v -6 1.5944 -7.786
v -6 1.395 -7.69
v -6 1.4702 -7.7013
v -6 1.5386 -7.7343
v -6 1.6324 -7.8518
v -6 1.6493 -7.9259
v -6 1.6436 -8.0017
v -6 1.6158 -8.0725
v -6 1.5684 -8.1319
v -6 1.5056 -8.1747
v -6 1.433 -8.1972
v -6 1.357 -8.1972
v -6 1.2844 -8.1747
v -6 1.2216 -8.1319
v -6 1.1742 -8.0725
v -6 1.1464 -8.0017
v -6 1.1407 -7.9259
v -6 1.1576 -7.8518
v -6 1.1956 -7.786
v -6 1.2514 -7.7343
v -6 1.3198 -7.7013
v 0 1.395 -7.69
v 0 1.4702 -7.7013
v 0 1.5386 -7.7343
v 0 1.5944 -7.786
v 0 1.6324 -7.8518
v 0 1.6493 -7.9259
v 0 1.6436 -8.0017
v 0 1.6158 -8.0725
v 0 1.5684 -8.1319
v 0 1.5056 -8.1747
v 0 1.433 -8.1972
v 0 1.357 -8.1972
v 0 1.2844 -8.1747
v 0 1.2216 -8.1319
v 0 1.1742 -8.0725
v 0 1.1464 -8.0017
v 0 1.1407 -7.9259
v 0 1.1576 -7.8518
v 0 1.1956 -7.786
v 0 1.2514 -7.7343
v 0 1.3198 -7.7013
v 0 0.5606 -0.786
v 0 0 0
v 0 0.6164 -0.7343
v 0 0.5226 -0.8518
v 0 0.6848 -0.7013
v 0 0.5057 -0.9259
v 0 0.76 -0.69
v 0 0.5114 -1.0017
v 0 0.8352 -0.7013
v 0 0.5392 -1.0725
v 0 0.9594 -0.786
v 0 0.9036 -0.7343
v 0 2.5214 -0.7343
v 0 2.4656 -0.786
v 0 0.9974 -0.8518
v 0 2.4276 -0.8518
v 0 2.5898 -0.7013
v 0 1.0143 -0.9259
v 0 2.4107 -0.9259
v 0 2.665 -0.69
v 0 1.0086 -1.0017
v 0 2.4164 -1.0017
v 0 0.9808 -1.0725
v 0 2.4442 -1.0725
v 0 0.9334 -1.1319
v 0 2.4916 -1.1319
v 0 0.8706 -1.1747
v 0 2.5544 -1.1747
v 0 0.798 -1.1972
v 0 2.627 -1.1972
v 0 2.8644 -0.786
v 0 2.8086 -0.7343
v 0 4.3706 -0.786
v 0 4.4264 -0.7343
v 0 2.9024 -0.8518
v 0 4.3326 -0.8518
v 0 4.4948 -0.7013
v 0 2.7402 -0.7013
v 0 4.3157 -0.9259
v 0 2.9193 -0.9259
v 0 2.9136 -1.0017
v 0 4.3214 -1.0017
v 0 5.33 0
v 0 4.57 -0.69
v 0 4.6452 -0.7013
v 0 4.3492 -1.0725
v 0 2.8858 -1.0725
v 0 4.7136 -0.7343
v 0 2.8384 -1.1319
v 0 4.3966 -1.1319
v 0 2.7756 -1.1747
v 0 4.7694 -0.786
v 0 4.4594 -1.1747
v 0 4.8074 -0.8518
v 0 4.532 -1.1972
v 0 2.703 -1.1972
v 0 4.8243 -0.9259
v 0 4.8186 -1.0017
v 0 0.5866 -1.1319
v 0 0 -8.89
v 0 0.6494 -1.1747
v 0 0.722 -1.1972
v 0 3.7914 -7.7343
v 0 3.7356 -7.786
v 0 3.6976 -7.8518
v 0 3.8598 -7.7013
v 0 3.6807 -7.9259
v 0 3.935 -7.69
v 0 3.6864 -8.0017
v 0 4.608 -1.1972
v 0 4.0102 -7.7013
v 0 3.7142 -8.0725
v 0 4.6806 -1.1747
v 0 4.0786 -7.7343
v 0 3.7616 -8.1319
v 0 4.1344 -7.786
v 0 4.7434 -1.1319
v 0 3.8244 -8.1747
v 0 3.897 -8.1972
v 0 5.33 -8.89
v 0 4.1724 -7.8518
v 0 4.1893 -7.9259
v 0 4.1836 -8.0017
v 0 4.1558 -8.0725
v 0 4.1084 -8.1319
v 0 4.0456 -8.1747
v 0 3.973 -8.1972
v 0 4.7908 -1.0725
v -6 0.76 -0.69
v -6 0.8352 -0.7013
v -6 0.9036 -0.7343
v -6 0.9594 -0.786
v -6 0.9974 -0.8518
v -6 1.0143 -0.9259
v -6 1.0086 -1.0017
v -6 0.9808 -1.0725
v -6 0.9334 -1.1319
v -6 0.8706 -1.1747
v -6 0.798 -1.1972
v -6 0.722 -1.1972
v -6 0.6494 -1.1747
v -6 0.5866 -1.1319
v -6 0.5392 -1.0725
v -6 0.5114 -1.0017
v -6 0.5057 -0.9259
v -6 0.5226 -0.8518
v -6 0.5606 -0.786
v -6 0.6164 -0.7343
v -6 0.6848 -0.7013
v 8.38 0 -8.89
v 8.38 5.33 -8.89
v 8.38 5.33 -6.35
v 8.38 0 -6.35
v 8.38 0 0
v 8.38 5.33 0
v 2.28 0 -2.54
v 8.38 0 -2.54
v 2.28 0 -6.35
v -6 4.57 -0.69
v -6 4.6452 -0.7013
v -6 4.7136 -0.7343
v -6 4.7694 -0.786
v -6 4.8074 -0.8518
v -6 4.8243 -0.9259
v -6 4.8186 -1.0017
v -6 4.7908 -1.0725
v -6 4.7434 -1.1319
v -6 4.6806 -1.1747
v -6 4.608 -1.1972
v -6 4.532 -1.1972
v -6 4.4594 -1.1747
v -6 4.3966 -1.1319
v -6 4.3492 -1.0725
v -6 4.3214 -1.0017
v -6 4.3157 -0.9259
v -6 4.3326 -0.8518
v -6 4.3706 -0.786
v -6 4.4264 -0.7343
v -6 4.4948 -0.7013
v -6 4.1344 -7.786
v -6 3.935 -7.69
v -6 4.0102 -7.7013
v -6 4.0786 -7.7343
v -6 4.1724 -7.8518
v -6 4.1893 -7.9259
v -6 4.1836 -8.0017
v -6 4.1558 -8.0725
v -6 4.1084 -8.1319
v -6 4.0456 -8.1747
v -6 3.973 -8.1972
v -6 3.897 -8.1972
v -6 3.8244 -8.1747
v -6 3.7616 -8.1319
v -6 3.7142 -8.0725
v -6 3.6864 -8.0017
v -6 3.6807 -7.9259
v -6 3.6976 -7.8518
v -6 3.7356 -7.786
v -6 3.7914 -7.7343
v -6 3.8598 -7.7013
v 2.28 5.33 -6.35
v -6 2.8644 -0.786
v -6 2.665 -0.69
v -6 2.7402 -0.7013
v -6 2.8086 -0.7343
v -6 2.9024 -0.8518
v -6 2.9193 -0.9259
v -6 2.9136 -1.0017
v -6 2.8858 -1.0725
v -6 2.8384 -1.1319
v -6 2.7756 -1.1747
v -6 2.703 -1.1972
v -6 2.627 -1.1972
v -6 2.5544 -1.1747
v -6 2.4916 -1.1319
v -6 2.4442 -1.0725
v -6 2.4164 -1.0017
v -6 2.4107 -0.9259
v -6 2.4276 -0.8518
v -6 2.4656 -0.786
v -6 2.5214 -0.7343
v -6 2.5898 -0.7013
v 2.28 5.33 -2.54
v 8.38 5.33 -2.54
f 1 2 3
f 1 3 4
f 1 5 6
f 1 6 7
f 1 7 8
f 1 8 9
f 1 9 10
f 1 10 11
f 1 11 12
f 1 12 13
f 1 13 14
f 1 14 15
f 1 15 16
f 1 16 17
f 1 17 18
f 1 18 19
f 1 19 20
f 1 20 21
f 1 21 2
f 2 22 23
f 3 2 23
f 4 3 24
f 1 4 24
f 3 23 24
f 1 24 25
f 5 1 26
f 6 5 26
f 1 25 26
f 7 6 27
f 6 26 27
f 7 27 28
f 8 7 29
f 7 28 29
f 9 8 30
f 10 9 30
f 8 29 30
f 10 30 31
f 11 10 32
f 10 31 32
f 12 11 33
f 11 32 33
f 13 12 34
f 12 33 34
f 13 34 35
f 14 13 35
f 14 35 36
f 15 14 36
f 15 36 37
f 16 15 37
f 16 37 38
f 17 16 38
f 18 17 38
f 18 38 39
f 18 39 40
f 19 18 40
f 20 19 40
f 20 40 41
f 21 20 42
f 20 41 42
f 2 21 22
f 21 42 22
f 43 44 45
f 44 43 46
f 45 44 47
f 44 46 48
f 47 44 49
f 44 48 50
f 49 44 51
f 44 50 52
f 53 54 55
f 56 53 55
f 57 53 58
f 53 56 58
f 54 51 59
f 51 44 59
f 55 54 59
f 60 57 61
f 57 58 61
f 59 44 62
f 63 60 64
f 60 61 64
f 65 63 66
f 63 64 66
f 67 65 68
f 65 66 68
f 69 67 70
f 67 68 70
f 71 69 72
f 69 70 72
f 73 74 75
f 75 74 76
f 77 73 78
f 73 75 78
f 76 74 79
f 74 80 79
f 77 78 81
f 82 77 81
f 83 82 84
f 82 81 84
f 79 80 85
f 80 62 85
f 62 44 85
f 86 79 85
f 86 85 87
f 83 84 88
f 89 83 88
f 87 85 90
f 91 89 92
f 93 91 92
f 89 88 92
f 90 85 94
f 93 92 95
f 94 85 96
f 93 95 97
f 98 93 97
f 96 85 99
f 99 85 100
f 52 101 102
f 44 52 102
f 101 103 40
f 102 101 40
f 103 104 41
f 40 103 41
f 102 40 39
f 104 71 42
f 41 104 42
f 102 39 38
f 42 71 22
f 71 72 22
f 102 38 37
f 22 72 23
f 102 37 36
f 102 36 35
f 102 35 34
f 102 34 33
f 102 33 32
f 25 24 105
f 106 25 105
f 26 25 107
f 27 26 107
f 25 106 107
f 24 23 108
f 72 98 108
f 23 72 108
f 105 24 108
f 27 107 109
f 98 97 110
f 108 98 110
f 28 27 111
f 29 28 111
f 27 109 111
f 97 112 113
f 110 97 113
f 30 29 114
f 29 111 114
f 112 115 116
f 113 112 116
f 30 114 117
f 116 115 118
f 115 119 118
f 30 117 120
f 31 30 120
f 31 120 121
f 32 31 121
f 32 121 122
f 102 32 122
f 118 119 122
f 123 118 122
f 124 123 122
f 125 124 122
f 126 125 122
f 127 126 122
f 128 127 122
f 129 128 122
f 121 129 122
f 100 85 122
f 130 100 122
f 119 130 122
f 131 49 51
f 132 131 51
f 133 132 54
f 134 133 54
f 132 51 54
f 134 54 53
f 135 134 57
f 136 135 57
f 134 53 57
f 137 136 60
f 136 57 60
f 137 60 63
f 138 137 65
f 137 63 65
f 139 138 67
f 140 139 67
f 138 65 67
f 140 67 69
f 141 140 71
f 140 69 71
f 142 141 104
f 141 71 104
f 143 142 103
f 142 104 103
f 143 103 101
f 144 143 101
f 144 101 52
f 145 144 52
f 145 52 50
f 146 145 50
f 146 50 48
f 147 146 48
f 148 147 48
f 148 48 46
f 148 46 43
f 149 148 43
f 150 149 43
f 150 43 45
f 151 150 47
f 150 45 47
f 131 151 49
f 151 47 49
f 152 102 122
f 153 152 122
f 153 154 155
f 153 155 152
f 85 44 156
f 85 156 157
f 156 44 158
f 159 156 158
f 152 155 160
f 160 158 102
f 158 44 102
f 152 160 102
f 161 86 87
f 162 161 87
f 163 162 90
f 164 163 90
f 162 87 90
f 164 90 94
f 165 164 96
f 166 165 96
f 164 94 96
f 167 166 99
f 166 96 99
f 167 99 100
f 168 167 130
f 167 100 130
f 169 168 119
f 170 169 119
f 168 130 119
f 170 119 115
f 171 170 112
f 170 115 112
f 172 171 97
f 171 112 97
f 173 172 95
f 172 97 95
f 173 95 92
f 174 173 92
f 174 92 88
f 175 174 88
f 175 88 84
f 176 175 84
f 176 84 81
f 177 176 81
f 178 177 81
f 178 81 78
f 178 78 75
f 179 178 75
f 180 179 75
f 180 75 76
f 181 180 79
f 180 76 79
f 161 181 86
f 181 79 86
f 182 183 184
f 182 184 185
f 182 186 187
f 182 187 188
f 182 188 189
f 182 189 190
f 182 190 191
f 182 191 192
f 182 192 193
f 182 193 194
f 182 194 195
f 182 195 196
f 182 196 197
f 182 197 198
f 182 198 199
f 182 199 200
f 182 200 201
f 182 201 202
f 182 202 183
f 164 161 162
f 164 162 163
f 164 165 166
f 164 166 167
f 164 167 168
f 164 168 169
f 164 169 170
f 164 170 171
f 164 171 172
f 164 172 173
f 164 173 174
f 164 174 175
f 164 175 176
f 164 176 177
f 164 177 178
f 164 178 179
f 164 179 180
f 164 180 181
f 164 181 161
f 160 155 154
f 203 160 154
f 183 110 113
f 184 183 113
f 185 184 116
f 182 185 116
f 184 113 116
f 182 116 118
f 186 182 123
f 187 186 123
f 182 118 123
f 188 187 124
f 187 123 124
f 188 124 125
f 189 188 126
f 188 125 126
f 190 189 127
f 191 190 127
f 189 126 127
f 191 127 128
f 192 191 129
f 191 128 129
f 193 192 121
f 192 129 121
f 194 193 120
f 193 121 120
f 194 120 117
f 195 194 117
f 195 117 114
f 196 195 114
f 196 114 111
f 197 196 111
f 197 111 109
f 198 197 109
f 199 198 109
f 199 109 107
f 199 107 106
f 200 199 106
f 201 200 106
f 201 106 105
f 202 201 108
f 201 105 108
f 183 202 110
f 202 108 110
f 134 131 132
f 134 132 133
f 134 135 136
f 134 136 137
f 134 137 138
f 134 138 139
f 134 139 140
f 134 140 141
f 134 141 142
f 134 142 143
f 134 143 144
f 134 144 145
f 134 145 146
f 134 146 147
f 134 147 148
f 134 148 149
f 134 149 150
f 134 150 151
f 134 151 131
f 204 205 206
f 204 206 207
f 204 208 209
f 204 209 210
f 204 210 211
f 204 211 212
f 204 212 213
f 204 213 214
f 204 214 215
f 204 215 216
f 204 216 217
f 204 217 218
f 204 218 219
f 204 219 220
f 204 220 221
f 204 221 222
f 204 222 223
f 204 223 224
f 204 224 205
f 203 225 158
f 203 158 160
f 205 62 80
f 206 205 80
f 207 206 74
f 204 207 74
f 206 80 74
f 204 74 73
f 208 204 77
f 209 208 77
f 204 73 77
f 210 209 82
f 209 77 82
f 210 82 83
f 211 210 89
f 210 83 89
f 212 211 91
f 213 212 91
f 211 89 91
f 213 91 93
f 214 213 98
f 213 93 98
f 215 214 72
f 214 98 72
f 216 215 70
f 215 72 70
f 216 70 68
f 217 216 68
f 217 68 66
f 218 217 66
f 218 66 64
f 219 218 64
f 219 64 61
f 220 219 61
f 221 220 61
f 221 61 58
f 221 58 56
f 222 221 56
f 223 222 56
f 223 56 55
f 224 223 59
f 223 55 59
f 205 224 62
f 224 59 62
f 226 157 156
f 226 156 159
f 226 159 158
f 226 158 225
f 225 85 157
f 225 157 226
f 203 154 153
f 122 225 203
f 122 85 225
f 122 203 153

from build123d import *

# Parameters (mm, degrees)
SKETCH1_W           = 8.89
SKETCH1_H           = 5.33
BOSS_EXTRUDE1_DEPTH = 8.38
SKETCH2_W           = 3.81
SKETCH2_H           = 5.33
CUT_EXTRUDE1_DEPTH  = 6.1
SKETCH3_R           = 0.255
BOSS_EXTRUDE2_DEPTH = 6


with BuildPart() as part:
    # Sketch1 → Boss-Extrude1 (new body)
    with BuildSketch(Plane(origin=(0, 0, 0), x_dir=(0, 0, -1), z_dir=(1, 0, 0))):
        with Locations((4.445, 2.665)):
            Rectangle(SKETCH1_W, SKETCH1_H)
    extrude(amount=BOSS_EXTRUDE1_DEPTH)

    # Sketch2 → Cut-Extrude1 (cut)
    with BuildSketch(Plane(origin=(8.38, 0, 0), x_dir=(0, 0, -1), z_dir=(1, 0, 0))):
        with Locations((4.445, 2.665)):
            Rectangle(SKETCH2_W, SKETCH2_H)
    extrude(amount=-CUT_EXTRUDE1_DEPTH, mode=Mode.SUBTRACT)

    # Sketch3 → Boss-Extrude2 (add)
    with BuildSketch(Plane.ZY):
        with Locations((-7.945, 3.935)):
            Circle(SKETCH3_R)
        with Locations((-7.945, 1.395)):
            Circle(SKETCH3_R)
        with Locations((-0.945, 4.57)):
            Circle(SKETCH3_R)
        with Locations((-0.945, 2.665)):
            Circle(SKETCH3_R)
        with Locations((-0.945, 0.76)):
            Circle(SKETCH3_R)
    extrude(amount=BOSS_EXTRUDE2_DEPTH)


solid = part.part
